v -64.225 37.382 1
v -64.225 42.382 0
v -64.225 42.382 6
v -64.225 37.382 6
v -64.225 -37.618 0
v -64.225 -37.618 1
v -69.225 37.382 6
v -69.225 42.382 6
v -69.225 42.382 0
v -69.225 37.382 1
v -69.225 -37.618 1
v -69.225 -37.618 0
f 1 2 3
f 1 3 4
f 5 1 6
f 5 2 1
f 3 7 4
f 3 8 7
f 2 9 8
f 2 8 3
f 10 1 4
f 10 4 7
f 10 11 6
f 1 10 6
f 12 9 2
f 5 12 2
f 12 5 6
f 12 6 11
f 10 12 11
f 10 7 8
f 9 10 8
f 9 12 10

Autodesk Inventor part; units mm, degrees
ref_plane "YZ Plane" through (0, 0, 0) normal (1, 0, 0) x (0, 1, 0)
ref_plane "XZ Plane" through (0, 0, 0) normal (0, 1, 0) x (-1, 0, 0)
ref_plane "XY Plane" through (0, 0, 0) normal (0, 0, 1) x (1, 0, 0)
sketch "스케치1" plane through (0, 0, 0) normal (0, 0, 1) x (1, 0, 0)
  line L0 (-69.2252, 42.3816) -> (-64.2252, 42.3816)
  line L1 (-64.2252, 42.3816) -> (-64.2252, -37.6184)
  line L2 (-64.2252, -37.6184) -> (-69.2252, -37.6184)
  line L3 (-69.2252, -37.6184) -> (-69.2252, 42.3816)
  point P0 (0, 0)
  point P1 (-66.7252, 42.3816)
  dimension "d0" = 5
  dimension "d1" = 80
extrude "돌출1" add sketch "스케치1" along normal blind 1
sketch "스케치2" plane through (0, 0, 1) normal (0, 0, 1) x (1, 0, 0)
  line L0 (-64.2252, 42.3816) -> (-69.2252, 42.3816) projected
  line L1 (-69.2252, 42.3816) -> (-64.2252, 42.3816)
  line L2 (-64.2252, 42.3816) -> (-64.2252, 37.3816)
  line L3 (-64.2252, 37.3816) -> (-69.2252, 37.3816)
  line L4 (-69.2252, 37.3816) -> (-69.2252, 42.3816)
  point P0 (0, 0)
  dimension "d7" = 5
  dimension "d8" = 5
extrude "돌출2" add sketch "스케치2" along normal blind 5
properties part number "display lock pin_3D 인쇄"
